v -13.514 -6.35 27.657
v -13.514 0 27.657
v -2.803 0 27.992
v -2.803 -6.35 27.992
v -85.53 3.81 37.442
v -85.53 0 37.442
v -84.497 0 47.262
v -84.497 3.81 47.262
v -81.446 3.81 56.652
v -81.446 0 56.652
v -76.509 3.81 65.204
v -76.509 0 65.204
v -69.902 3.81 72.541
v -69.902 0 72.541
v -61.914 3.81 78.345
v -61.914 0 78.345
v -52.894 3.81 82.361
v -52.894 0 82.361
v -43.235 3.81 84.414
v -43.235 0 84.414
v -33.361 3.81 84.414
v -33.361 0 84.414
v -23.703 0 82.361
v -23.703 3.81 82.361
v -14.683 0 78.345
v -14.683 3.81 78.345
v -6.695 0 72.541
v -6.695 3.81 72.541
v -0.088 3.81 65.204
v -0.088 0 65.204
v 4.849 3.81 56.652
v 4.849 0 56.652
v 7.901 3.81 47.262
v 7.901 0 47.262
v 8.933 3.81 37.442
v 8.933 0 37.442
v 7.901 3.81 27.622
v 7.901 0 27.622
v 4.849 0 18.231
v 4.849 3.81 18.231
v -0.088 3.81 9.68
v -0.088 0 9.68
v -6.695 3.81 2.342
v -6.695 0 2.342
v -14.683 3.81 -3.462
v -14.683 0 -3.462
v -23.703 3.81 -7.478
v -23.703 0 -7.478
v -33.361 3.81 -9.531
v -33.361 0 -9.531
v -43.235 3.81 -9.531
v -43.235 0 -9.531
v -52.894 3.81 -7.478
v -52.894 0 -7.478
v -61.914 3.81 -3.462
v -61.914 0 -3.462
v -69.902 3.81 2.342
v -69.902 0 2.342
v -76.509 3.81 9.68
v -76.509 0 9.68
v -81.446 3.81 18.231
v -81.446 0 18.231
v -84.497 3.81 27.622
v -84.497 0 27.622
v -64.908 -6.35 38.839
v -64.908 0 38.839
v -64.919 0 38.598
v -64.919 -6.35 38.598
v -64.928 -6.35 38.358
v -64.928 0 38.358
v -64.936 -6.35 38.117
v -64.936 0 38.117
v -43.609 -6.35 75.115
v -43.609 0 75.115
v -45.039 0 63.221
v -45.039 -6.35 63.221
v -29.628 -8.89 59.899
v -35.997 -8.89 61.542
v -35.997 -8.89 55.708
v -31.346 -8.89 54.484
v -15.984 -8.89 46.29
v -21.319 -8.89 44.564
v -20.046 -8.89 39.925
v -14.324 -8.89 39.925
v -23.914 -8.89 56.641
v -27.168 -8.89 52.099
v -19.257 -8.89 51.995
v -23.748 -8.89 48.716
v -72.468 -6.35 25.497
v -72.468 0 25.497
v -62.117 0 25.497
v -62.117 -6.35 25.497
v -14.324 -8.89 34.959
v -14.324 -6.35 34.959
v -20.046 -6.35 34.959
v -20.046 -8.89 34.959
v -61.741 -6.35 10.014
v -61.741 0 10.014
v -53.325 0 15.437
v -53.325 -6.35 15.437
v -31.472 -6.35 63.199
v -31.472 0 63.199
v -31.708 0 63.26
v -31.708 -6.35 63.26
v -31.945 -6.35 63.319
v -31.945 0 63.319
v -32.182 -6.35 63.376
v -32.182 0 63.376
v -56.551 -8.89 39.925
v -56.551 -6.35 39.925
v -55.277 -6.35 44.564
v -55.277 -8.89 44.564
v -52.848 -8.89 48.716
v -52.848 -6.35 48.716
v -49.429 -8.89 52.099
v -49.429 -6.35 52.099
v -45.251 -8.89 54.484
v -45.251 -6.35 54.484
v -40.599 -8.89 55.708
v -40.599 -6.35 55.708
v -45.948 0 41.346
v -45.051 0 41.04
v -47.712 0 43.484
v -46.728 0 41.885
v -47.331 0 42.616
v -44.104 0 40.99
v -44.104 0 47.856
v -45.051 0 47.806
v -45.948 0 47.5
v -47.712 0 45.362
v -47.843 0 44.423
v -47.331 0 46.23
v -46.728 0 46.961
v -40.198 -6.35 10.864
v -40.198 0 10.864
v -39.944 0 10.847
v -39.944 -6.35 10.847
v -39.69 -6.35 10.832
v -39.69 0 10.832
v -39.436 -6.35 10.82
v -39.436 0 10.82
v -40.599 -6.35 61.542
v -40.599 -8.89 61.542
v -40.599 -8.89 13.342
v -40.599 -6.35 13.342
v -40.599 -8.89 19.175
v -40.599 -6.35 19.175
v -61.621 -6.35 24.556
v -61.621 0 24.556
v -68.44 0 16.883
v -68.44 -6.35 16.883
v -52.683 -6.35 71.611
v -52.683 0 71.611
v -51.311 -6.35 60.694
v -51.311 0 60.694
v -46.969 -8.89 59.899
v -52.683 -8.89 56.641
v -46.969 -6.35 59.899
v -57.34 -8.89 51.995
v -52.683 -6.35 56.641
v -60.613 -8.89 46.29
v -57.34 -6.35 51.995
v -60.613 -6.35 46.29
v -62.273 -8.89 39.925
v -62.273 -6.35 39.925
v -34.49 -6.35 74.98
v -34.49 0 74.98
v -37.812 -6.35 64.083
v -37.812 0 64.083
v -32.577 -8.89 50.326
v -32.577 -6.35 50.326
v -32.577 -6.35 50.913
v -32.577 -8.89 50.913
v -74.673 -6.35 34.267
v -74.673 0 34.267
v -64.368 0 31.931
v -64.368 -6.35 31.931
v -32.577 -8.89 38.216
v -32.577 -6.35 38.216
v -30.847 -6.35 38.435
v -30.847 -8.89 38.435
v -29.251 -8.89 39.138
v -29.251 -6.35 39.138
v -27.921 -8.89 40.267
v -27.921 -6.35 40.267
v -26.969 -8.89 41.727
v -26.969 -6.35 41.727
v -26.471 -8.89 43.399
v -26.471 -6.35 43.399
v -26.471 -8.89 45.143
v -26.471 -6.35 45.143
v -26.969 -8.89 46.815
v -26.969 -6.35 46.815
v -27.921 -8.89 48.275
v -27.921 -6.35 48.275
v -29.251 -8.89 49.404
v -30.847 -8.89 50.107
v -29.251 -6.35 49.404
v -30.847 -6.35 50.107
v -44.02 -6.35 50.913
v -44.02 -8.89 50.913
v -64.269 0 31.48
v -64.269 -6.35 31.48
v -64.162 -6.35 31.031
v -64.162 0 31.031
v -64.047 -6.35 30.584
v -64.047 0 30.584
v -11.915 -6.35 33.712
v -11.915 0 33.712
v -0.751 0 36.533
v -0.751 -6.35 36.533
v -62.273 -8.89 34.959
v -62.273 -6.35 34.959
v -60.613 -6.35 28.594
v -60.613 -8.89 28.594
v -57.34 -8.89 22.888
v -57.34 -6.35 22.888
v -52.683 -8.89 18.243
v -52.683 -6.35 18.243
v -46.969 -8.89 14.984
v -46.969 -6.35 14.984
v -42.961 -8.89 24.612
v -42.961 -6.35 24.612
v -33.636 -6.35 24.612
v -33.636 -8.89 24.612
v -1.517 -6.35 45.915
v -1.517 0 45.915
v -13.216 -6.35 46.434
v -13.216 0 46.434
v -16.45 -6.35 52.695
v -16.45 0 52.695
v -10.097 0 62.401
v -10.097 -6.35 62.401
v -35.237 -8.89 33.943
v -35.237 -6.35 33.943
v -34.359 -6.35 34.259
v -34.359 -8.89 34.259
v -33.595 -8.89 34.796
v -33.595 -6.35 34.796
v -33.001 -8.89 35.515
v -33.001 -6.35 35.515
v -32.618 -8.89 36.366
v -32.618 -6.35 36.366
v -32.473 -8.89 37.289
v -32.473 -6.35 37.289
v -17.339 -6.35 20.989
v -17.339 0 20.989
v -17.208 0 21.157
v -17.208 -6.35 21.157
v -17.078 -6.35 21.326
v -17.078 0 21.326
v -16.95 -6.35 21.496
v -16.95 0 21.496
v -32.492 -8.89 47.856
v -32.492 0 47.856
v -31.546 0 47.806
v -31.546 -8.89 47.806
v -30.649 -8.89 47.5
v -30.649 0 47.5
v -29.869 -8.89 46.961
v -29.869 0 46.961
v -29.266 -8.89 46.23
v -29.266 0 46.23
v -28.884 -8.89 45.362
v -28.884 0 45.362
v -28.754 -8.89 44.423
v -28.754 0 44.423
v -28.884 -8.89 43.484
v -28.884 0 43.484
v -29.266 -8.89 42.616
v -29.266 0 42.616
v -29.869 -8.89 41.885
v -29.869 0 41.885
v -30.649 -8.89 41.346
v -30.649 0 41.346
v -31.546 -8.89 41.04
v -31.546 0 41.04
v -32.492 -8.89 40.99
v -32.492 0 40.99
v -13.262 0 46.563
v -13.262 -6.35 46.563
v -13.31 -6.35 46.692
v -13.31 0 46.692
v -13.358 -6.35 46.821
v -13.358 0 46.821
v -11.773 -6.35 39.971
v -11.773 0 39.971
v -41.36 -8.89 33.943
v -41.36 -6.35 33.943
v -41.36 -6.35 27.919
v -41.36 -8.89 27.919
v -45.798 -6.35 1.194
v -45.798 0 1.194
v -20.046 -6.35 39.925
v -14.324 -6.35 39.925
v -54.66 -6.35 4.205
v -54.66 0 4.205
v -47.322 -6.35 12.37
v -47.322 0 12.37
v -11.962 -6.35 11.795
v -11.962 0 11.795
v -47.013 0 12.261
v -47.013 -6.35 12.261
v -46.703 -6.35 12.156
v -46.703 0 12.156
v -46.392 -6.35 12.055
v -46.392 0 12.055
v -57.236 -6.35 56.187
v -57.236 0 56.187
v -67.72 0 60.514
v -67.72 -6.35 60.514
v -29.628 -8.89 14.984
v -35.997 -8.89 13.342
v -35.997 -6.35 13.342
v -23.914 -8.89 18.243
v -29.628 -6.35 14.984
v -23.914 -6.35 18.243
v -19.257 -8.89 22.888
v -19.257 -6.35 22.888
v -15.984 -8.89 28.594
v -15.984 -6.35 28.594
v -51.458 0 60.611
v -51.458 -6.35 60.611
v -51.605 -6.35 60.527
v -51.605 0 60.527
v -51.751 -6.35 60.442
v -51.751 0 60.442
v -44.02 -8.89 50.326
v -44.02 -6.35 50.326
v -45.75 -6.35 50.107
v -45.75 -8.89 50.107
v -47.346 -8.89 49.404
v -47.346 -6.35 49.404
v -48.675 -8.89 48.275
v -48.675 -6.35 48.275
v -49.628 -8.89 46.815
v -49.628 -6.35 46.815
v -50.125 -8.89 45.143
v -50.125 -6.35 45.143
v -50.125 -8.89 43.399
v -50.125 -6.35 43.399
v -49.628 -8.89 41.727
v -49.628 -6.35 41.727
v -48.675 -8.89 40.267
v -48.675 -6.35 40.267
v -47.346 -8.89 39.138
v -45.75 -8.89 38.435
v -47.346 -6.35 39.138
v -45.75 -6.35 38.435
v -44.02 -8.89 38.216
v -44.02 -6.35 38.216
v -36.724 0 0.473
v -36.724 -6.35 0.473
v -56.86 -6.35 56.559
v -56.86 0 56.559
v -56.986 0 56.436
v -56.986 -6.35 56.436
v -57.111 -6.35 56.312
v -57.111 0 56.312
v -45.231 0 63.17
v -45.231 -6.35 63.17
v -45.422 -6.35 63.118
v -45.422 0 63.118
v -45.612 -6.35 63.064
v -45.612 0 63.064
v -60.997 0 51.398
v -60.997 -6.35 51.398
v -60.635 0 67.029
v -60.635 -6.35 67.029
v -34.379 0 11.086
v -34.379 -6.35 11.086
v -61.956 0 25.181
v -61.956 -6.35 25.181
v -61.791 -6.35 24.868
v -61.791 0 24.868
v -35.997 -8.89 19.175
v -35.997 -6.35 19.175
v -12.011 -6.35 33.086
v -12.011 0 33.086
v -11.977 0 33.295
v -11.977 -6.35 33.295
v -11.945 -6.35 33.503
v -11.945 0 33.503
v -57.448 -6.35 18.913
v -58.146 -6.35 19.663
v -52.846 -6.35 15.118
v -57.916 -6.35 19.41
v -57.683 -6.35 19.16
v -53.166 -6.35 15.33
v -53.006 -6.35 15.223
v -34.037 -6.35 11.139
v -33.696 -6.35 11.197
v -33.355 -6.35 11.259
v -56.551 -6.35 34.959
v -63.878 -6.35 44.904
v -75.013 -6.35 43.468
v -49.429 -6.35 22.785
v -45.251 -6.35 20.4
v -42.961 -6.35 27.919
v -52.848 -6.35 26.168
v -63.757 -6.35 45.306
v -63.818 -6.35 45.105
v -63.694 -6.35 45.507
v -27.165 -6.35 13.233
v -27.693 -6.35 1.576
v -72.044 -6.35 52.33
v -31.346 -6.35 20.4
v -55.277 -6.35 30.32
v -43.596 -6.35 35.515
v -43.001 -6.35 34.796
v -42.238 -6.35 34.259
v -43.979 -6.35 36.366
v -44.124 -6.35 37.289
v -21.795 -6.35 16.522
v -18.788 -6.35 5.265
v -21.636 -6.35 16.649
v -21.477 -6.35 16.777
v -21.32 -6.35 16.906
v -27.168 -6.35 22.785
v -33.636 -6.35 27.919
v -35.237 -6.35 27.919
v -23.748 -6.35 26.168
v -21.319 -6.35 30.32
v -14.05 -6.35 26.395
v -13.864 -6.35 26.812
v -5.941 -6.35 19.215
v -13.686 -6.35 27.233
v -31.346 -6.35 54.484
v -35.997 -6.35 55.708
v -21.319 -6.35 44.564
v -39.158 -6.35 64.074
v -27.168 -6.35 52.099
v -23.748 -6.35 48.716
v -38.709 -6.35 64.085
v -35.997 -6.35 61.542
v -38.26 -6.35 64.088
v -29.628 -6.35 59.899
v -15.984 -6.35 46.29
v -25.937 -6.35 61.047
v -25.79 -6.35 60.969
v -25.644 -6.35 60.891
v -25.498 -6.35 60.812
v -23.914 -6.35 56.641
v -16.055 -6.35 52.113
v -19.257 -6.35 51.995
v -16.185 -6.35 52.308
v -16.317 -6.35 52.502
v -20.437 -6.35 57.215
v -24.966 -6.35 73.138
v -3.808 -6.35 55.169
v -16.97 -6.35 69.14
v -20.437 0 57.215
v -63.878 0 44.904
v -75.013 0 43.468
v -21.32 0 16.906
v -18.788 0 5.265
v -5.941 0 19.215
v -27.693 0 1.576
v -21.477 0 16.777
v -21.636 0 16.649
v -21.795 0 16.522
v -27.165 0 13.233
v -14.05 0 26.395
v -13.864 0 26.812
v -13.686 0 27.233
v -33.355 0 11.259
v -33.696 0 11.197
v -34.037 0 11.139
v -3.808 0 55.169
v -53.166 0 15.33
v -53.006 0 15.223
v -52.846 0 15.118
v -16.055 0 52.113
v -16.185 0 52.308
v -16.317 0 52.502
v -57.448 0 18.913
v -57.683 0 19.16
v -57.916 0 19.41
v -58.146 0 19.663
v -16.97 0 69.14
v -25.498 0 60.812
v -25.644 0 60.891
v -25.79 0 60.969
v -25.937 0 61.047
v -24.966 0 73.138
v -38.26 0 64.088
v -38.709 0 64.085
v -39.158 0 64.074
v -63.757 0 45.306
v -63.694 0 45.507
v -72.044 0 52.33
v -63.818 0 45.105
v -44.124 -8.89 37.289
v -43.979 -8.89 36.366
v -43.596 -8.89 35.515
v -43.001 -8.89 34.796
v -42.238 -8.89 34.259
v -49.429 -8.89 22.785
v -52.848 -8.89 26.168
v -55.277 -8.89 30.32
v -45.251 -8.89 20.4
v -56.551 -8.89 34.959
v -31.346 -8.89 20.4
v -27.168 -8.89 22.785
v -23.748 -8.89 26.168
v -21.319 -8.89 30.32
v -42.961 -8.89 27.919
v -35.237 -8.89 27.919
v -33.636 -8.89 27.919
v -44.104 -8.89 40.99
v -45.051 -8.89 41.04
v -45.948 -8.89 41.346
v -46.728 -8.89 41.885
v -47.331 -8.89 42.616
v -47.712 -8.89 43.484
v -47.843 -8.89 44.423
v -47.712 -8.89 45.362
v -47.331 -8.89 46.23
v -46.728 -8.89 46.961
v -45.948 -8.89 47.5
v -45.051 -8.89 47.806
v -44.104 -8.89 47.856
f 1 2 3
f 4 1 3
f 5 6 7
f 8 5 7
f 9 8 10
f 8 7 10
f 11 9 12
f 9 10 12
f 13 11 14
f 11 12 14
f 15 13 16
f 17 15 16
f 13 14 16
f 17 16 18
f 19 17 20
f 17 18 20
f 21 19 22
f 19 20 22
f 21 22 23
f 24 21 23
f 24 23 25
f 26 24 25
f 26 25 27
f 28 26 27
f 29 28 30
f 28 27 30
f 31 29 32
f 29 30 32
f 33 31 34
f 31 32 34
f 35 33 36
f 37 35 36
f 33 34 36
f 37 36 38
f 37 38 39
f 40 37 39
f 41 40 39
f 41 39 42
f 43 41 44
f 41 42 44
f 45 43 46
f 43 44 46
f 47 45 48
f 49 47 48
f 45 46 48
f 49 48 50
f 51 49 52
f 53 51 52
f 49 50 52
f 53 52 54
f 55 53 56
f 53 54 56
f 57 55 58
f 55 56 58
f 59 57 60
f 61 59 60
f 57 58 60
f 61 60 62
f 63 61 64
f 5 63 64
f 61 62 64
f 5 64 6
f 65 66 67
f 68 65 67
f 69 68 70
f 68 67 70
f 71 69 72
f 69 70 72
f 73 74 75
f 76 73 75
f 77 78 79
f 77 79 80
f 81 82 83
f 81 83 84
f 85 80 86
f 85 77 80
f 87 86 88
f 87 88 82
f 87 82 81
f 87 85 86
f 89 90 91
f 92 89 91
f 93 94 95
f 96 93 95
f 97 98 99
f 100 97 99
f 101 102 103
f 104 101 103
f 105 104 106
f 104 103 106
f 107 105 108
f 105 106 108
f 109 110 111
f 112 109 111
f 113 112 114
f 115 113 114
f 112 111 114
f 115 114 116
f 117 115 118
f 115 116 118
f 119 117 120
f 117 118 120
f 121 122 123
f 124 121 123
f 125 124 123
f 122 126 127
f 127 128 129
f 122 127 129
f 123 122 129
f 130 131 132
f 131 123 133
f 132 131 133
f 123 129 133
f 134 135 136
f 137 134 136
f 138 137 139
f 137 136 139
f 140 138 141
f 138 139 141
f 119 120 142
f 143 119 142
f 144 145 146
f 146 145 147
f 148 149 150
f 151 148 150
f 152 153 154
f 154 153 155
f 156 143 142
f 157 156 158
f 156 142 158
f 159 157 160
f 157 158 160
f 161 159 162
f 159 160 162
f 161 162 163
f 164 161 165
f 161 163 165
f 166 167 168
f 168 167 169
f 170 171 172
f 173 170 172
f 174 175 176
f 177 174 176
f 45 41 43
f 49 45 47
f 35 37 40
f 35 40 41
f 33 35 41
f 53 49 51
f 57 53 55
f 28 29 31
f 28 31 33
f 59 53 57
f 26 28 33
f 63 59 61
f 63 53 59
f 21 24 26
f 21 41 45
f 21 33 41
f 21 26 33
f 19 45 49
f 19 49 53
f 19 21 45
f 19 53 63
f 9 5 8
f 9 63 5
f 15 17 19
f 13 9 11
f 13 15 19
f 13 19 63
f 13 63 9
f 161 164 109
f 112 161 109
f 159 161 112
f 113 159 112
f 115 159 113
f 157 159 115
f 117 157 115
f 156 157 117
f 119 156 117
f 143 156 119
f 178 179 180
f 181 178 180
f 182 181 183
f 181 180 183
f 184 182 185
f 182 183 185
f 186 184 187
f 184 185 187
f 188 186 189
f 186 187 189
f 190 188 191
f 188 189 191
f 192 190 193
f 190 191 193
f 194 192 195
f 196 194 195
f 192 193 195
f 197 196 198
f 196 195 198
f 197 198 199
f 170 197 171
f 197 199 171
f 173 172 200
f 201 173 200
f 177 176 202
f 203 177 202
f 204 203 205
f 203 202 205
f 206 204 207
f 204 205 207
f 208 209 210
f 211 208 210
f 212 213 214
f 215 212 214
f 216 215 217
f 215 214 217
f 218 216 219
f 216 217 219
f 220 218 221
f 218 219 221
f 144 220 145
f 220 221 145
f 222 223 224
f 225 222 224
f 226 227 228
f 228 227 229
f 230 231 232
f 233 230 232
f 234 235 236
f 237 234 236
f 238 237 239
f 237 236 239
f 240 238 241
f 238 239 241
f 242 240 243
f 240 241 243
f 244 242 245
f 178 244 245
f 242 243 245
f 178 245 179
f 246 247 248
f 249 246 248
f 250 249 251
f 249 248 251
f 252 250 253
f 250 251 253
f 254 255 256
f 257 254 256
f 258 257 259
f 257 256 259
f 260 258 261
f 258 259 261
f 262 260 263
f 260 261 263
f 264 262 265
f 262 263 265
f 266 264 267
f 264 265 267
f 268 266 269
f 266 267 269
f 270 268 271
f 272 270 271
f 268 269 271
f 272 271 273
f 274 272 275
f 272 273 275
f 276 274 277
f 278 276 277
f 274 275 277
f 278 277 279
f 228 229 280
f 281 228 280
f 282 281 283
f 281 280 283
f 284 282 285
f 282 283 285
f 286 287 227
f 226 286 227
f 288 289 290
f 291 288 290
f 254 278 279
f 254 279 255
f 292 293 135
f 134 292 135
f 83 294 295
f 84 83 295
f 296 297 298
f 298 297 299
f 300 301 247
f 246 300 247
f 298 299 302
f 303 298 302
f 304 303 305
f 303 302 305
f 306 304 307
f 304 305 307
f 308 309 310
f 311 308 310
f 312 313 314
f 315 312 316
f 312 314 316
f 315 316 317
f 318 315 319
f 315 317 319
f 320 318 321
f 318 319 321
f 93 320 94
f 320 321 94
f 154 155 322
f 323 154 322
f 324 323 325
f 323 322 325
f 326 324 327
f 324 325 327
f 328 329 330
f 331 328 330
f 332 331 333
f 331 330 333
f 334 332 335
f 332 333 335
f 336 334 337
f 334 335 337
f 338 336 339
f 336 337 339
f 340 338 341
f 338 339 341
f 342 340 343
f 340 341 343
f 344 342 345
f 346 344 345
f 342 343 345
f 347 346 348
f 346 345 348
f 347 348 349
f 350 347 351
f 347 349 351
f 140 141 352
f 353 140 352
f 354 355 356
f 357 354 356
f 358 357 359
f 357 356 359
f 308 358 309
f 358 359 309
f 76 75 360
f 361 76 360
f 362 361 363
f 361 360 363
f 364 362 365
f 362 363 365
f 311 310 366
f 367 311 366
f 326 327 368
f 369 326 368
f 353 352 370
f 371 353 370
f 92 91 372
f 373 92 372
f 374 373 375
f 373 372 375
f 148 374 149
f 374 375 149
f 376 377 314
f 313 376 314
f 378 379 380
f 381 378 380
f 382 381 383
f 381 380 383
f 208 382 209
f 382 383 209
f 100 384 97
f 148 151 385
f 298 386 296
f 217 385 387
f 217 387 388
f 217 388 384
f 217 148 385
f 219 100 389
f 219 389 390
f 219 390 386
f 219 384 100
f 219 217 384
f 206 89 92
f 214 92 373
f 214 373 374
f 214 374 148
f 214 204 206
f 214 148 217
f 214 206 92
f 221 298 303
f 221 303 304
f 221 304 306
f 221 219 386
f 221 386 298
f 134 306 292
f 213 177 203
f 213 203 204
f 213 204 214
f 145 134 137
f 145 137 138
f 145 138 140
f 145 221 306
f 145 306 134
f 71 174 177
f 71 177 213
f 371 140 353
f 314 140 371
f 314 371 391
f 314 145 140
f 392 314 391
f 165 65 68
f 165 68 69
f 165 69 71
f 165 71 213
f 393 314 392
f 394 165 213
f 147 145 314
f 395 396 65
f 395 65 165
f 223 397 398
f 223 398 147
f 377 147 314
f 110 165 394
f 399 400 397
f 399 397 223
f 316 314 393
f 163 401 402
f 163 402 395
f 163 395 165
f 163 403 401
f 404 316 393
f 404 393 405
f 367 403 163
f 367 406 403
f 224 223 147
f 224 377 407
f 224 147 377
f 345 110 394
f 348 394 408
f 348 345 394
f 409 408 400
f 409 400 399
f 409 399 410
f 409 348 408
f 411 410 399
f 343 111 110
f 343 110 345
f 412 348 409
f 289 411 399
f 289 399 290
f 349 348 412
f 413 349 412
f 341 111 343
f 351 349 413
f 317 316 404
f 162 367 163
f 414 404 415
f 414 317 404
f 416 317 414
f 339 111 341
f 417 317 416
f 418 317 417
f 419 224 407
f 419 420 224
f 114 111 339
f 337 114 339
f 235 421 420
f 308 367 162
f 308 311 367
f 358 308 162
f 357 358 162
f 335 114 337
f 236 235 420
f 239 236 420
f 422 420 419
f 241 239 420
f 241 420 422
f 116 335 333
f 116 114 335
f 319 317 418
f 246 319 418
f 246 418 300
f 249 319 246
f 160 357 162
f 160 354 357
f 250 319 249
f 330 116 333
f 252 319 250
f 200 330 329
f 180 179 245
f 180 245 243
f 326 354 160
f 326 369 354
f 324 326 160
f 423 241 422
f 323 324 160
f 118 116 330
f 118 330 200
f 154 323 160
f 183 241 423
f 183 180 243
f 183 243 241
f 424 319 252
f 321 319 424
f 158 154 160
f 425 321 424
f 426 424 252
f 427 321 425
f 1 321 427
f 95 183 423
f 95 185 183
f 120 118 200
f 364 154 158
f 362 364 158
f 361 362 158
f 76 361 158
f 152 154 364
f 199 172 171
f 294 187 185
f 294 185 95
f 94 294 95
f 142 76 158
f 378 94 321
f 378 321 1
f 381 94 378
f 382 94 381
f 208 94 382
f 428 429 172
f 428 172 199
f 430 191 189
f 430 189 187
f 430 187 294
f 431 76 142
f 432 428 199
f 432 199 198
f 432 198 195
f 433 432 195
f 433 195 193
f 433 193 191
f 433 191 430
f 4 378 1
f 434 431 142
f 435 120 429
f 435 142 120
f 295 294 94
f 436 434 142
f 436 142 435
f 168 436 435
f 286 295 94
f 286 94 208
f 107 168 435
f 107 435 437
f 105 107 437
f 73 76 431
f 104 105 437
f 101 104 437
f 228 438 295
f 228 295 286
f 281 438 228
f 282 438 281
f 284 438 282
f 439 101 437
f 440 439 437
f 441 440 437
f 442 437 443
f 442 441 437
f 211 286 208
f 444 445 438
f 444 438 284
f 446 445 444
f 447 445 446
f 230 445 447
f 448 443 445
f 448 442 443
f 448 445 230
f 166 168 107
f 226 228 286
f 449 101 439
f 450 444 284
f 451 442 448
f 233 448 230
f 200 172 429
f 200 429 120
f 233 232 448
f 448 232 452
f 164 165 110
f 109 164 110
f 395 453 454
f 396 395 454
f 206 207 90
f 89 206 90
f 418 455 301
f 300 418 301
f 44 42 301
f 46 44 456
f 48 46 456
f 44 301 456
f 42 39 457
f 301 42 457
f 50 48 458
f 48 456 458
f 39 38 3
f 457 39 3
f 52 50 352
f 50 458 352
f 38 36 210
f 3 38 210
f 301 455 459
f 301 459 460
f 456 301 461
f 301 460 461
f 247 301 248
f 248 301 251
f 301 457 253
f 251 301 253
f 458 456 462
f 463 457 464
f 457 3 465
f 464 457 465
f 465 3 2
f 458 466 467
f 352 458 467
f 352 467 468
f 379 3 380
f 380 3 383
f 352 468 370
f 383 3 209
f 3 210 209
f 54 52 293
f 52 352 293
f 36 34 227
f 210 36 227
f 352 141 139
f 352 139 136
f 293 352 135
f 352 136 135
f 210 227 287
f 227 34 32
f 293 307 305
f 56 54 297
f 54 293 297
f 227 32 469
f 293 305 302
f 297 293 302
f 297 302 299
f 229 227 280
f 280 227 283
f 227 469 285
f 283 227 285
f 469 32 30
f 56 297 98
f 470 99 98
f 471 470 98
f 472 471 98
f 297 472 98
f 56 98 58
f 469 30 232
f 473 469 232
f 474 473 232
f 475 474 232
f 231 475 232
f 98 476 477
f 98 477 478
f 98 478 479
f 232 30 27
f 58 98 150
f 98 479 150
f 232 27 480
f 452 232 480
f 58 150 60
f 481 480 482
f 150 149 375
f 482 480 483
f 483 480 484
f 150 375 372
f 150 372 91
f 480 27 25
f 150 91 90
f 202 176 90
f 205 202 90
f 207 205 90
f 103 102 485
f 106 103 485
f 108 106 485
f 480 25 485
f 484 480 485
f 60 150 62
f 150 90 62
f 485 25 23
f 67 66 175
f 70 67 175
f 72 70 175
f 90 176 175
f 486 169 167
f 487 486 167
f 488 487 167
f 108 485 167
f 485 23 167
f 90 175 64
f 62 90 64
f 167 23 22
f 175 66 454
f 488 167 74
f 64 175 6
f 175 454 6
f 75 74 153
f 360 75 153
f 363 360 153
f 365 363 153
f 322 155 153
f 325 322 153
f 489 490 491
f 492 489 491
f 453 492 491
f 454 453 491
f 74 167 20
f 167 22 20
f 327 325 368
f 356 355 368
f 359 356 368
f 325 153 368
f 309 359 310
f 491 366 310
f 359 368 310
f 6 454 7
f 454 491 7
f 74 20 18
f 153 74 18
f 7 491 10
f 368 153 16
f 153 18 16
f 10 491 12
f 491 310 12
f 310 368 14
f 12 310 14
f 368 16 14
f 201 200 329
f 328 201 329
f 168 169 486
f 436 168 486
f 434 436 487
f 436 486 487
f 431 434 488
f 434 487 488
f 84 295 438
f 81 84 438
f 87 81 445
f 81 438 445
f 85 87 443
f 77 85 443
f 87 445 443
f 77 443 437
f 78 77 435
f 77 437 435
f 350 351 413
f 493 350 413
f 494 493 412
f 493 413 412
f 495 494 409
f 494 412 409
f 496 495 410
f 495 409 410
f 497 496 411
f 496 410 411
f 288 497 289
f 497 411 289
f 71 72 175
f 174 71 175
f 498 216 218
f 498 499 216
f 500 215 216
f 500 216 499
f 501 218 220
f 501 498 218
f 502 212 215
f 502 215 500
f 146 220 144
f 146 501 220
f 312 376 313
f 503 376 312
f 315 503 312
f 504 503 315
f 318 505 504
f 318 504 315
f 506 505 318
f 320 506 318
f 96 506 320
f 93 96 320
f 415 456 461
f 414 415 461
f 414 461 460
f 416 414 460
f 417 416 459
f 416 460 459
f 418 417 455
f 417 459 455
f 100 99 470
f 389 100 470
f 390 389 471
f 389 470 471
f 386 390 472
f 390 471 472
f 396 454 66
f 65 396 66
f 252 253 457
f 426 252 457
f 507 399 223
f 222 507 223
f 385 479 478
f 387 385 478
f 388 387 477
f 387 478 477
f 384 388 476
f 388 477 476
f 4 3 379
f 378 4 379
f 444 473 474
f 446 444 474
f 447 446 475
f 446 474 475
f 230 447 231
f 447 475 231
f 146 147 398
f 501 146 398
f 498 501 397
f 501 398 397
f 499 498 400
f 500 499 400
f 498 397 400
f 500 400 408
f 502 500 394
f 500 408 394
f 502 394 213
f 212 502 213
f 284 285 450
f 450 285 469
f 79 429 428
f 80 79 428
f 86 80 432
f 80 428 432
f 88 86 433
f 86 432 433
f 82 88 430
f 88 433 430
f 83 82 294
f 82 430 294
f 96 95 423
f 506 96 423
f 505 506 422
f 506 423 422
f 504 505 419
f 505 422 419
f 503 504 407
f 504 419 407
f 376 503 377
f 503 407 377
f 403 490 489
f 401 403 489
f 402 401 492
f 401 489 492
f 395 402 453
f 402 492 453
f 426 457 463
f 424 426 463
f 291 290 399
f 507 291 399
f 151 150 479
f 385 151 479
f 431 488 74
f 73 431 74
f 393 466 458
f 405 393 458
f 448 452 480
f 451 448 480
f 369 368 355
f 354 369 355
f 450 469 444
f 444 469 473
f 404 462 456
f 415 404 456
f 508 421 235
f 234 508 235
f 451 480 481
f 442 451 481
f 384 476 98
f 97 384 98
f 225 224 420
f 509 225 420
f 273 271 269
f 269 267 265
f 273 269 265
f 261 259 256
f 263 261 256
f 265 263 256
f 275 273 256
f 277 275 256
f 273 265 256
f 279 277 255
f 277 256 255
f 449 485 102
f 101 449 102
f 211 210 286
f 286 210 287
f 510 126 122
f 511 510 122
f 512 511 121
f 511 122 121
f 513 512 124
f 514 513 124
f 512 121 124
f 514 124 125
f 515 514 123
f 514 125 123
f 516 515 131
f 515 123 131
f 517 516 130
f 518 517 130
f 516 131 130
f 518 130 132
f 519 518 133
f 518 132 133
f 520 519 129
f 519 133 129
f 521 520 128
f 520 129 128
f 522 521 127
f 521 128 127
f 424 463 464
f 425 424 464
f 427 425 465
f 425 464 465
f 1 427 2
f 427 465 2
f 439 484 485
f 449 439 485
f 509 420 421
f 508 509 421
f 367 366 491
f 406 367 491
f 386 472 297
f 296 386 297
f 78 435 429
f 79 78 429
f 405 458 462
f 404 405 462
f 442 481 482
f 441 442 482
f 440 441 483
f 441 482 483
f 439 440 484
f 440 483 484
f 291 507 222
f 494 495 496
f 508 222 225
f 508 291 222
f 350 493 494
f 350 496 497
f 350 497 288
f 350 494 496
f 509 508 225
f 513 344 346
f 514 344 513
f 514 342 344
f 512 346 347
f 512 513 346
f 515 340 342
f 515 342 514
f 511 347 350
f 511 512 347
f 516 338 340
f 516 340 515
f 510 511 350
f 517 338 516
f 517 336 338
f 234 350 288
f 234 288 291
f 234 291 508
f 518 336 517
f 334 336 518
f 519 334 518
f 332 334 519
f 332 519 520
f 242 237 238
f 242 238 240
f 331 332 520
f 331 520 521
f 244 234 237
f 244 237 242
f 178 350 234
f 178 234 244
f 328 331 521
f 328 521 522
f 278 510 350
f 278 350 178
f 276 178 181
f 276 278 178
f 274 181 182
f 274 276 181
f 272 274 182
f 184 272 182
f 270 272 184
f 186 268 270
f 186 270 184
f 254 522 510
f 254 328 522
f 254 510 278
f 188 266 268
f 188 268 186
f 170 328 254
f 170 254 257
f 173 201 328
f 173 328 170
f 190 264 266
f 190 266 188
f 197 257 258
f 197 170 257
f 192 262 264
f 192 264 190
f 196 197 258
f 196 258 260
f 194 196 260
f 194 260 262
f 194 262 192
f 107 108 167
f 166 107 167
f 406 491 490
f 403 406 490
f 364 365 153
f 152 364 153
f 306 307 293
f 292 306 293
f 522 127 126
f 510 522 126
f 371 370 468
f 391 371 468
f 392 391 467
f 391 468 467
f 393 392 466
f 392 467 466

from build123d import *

# Parameters (mm, degrees)
F1_DEPTH = 6.35
F2_DEPTH = 8.89
F3_R     = 47.231154
F4_DEPTH = 3.81


with BuildPart() as f1:
    # F0 (on Front) → F1 (new body)
    with BuildSketch(Plane.XZ):
        with BuildLine():
            Line((-72.468472, 25.497057), (-62.116886, 25.497057))
            ThreePointArc((-62.116886, 25.497057), (-63.211959, 27.991302), (-64.046652, 30.584319))
            Line((-64.046652, 30.584319), (-72.468472, 25.497057))
        make_face()
        with BuildLine():
            Line((-68.440348, 16.882773), (-58.145573, 19.662977))
            ThreePointArc((-58.145573, 19.662977), (-60.02173, 22.01151), (-61.621433, 24.556412))
            Line((-61.621433, 24.556412), (-68.440348, 16.882773))
        make_face()
        with BuildLine():
            Line((-61.740946, 10.013767), (-53.325096, 15.437365))
            ThreePointArc((-53.325096, 15.437365), (-55.474469, 17.070756), (-57.447538, 18.913246))
            Line((-57.447538, 18.913246), (-61.740946, 10.013767))
        make_face()
        with BuildLine():
            Line((-54.659933, 4.204792), (-47.321835, 12.370412))
            ThreePointArc((-47.321835, 12.370412), (-50.163723, 13.583659), (-52.846042, 15.117758))
            Line((-52.846042, 15.117758), (-54.659933, 4.204792))
        make_face()
        with BuildLine():
            Line((-45.798071, 1.194302), (-40.197733, 10.863806))
            ThreePointArc((-40.197733, 10.863806), (-43.33033, 11.275472), (-46.392177, 12.055038))
            Line((-46.392177, 12.055038), (-45.798071, 1.194302))
        make_face()
        with BuildLine():
            Line((-27.692726, 1.575914), (-27.164938, 13.233446))
            ThreePointArc((-27.164938, 13.233446), (-30.199563, 12.056629), (-33.355031, 11.258583))
            Line((-33.355031, 11.258583), (-27.692726, 1.575914))
        make_face()
        with BuildLine():
            Line((-36.724199, 0.473481), (-34.378867, 11.085872))
            ThreePointArc((-34.378867, 11.085872), (-36.901094, 10.832685), (-39.435966, 10.82032))
            Line((-39.435966, 10.82032), (-36.724199, 0.473481))
        make_face()
        with BuildLine():
            Line((-18.788459, 5.264825), (-21.794904, 16.522102))
            ThreePointArc((-21.794904, 16.522102), (-24.382431, 14.718584), (-27.164938, 13.233446))
            Line((-27.164938, 13.233446), (-18.788459, 5.264825))
        make_face()
        with BuildLine():
            Line((-11.961851, 11.79462), (-17.338687, 20.989131))
            ThreePointArc((-17.338687, 20.989131), (-19.219819, 18.840528), (-21.32009, 16.905583))
            Line((-21.32009, 16.905583), (-11.961851, 11.79462))
        make_face()
        with BuildLine():
            Line((-5.94087, 19.214842), (-14.050301, 26.395063))
            ThreePointArc((-14.050301, 26.395063), (-15.369085, 23.868043), (-16.950265, 21.496357))
            Line((-16.950265, 21.496357), (-5.94087, 19.214842))
        make_face()
        with BuildLine():
            Line((-2.803177, 27.991908), (-12.01095, 33.086167))
            ThreePointArc((-12.01095, 33.086167), (-12.618733, 30.331533), (-13.514323, 27.656588))
            Line((-13.514323, 27.656588), (-2.803177, 27.991908))
        make_face()
        with BuildLine():
            ThreePointArc((-11.772855, 39.971174), (-11.682633, 38.707943), (-11.652537, 37.441852))
            ThreePointArc((-11.652537, 37.441852), (-11.718199, 35.572378), (-11.914862, 33.712118))
            Line((-11.914862, 33.712118), (-0.750545, 36.533233))
            Line((-0.750545, 36.533233), (-11.772855, 39.971174))
        make_face()
        with BuildLine():
            ThreePointArc((-13.215669, 46.433987), (-12.292717, 43.247575), (-11.772855, 39.971174))
            Line((-11.772855, 39.971174), (-1.516628, 45.914907))
            Line((-1.516628, 45.914907), (-13.215669, 46.433987))
        make_face()
        with BuildLine():
            ThreePointArc((-16.055091, 52.112807), (-14.558451, 49.542126), (-13.357668, 46.820646))
            Line((-13.357668, 46.820646), (-3.80768, 55.16896))
            Line((-3.80768, 55.16896), (-16.055091, 52.112807))
        make_face()
        with BuildLine():
            ThreePointArc((-20.436903, 57.21477), (-18.31548, 55.068095), (-16.450419, 52.69529))
            Line((-16.450419, 52.69529), (-10.096844, 62.401496))
            Line((-10.096844, 62.401496), (-20.436903, 57.21477))
        make_face()
        with BuildLine():
            ThreePointArc((-25.497871, 60.81165), (-22.862262, 59.161126), (-20.436903, 57.21477))
            Line((-20.436903, 57.21477), (-16.969999, 69.139883))
            Line((-16.969999, 69.139883), (-25.497871, 60.81165))
        make_face()
        with BuildLine():
            ThreePointArc((-31.47247, 63.198546), (-28.644405, 62.277334), (-25.936627, 61.046672))
            Line((-25.936627, 61.046672), (-24.966219, 73.137991))
            Line((-24.966219, 73.137991), (-31.47247, 63.198546))
        make_face()
        with BuildLine():
            ThreePointArc((-37.811687, 64.083234), (-34.977744, 63.87996), (-32.181556, 63.376091))
            Line((-32.181556, 63.376091), (-34.489807, 74.979819))
            Line((-34.489807, 74.979819), (-37.811687, 64.083234))
        make_face()
        with BuildLine():
            ThreePointArc((-45.039301, 63.220911), (-42.122507, 63.811835), (-39.158008, 64.073808))
            Line((-39.158008, 64.073808), (-43.60909, 75.114585))
            Line((-43.60909, 75.114585), (-45.039301, 63.220911))
        make_face()
        with BuildLine():
            ThreePointArc((-51.31089, 60.694255), (-48.530531, 62.044756), (-45.61248, 63.064182))
            Line((-45.61248, 63.064182), (-52.68345, 71.61063))
            Line((-52.68345, 71.61063), (-51.31089, 60.694255))
        make_face()
        with BuildLine():
            ThreePointArc((-56.859722, 56.559281), (-54.422673, 58.655215), (-51.750978, 60.442445))
            Line((-51.750978, 60.442445), (-60.634747, 67.028522))
            Line((-60.634747, 67.028522), (-56.859722, 56.559281))
        make_face()
        with BuildLine():
            ThreePointArc((-60.99712, 51.397732), (-59.253808, 53.899964), (-57.236001, 56.186611))
            Line((-57.236001, 56.186611), (-67.719519, 60.513683))
            Line((-67.719519, 60.513683), (-60.99712, 51.397732))
        make_face()
        with BuildLine():
            ThreePointArc((-63.694328, 45.506906), (-62.525435, 48.534603), (-60.99712, 51.397732))
            Line((-60.99712, 51.397732), (-72.044447, 52.330237))
            Line((-72.044447, 52.330237), (-63.694328, 45.506906))
        make_face()
        with BuildLine():
            ThreePointArc((-64.907544, 38.838859), (-64.568395, 41.901175), (-63.878012, 44.90387))
            Line((-63.878012, 44.90387), (-75.012535, 43.468371))
            Line((-75.012535, 43.468371), (-64.907544, 38.838859))
        make_face()
        with BuildLine():
            ThreePointArc((-64.368101, 31.931053), (-64.832743, 35.007338), (-64.935641, 38.116812))
            Line((-64.935641, 38.116812), (-74.673332, 34.267295))
            Line((-74.673332, 34.267295), (-64.368101, 31.931053))
        make_face()
        with BuildLine():
            ThreePointArc((-11.914862, 33.712118), (-11.718199, 35.572378), (-11.652537, 37.441852))
            ThreePointArc((-11.652537, 37.441852), (-11.682633, 38.707943), (-11.772855, 39.971174))
            ThreePointArc((-11.772855, 39.971174), (-12.292717, 43.247575), (-13.215669, 46.433987))
            ThreePointArc((-13.215669, 46.433987), (-13.285921, 46.627591), (-13.357668, 46.820646))
            ThreePointArc((-13.357668, 46.820646), (-14.558451, 49.542126), (-16.055091, 52.112807))
            ThreePointArc((-16.055091, 52.112807), (-16.250831, 52.405354), (-16.450419, 52.69529))
            ThreePointArc((-16.450419, 52.69529), (-18.31548, 55.068095), (-20.436903, 57.21477))
            ThreePointArc((-20.436903, 57.21477), (-22.862262, 59.161126), (-25.497871, 60.81165))
            ThreePointArc((-25.497871, 60.81165), (-25.7167, 60.930186), (-25.936627, 61.046672))
            ThreePointArc((-25.936627, 61.046672), (-28.644405, 62.277334), (-31.47247, 63.198546))
            ThreePointArc((-31.47247, 63.198546), (-31.826404, 63.28975), (-32.181556, 63.376091))
            ThreePointArc((-32.181556, 63.376091), (-34.977744, 63.87996), (-37.811687, 64.083234))
            ThreePointArc((-37.811687, 64.083234), (-38.484907, 64.087026), (-39.158008, 64.073808))
            ThreePointArc((-39.158008, 64.073808), (-42.122507, 63.811835), (-45.039301, 63.220911))
            ThreePointArc((-45.039301, 63.220911), (-45.326327, 63.144144), (-45.61248, 63.064182))
            ThreePointArc((-45.61248, 63.064182), (-48.530531, 62.044756), (-51.31089, 60.694255))
            ThreePointArc((-51.31089, 60.694255), (-51.531533, 60.569397), (-51.750978, 60.442445))
            ThreePointArc((-51.750978, 60.442445), (-54.422673, 58.655215), (-56.859722, 56.559281))
            ThreePointArc((-56.859722, 56.559281), (-57.048788, 56.373881), (-57.236001, 56.186611))
            ThreePointArc((-57.236001, 56.186611), (-59.253808, 53.899964), (-60.99712, 51.397732))
            ThreePointArc((-60.99712, 51.397732), (-62.525435, 48.534603), (-63.694328, 45.506906))
            ThreePointArc((-63.694328, 45.506906), (-63.787954, 45.205932), (-63.878012, 44.90387))
            ThreePointArc((-63.878012, 44.90387), (-64.568395, 41.901175), (-64.907544, 38.838859))
            ThreePointArc((-64.907544, 38.838859), (-64.924041, 38.47793), (-64.935641, 38.116812))
            ThreePointArc((-64.935641, 38.116812), (-64.832743, 35.007338), (-64.368101, 31.931053))
            ThreePointArc((-64.368101, 31.931053), (-64.216126, 31.255598), (-64.046652, 30.584319))
            ThreePointArc((-64.046652, 30.584319), (-63.211959, 27.991302), (-62.116886, 25.497057))
            ThreePointArc((-62.116886, 25.497057), (-61.873851, 25.024263), (-61.621433, 24.556412))
            ThreePointArc((-61.621433, 24.556412), (-60.02173, 22.01151), (-58.145573, 19.662977))
            ThreePointArc((-58.145573, 19.662977), (-57.800159, 19.284757), (-57.447538, 18.913246))
            ThreePointArc((-57.447538, 18.913246), (-55.474469, 17.070756), (-53.325096, 15.437365))
            ThreePointArc((-53.325096, 15.437365), (-53.086433, 15.276267), (-52.846042, 15.117758))
            ThreePointArc((-52.846042, 15.117758), (-50.163723, 13.583659), (-47.321835, 12.370412))
            ThreePointArc((-47.321835, 12.370412), (-46.858458, 12.208444), (-46.392177, 12.055038))
            ThreePointArc((-46.392177, 12.055038), (-43.33033, 11.275472), (-40.197733, 10.863806))
            ThreePointArc((-40.197733, 10.863806), (-39.817005, 10.839336), (-39.435966, 10.82032))
            ThreePointArc((-39.435966, 10.82032), (-36.901094, 10.832685), (-34.378867, 11.085872))
            ThreePointArc((-34.378867, 11.085872), (-33.866108, 11.16724), (-33.355031, 11.258583))
            ThreePointArc((-33.355031, 11.258583), (-30.199563, 12.056629), (-27.164938, 13.233446))
            ThreePointArc((-27.164938, 13.233446), (-24.382431, 14.718584), (-21.794904, 16.522102))
            ThreePointArc((-21.794904, 16.522102), (-21.556399, 16.712483), (-21.32009, 16.905583))
            ThreePointArc((-21.32009, 16.905583), (-19.219819, 18.840528), (-17.338687, 20.989131))
            ThreePointArc((-17.338687, 20.989131), (-17.142956, 21.24158), (-16.950265, 21.496357))
            ThreePointArc((-16.950265, 21.496357), (-15.369085, 23.868043), (-14.050301, 26.395063))
            ThreePointArc((-14.050301, 26.395063), (-13.774199, 27.022379), (-13.514323, 27.656588))
            ThreePointArc((-13.514323, 27.656588), (-12.618733, 30.331533), (-12.01095, 33.086167))
            ThreePointArc((-12.01095, 33.086167), (-11.961046, 33.398857), (-11.914862, 33.712118))
        make_face()
        with BuildLine():
            Line((-62.272575, 34.958918), (-56.551188, 34.958918))
            ThreePointArc((-56.551188, 34.958918), (-51.24926, 24.364516), (-40.599231, 19.175231))
            Line((-40.599231, 19.175231), (-40.599231, 13.341561))
            ThreePointArc((-40.599231, 13.341561), (-55.165827, 20.410655), (-62.272575, 34.958918))
        make_face(mode=Mode.SUBTRACT)
        with BuildLine():
            Line((-44.019647, 50.325666), (-44.019647, 50.912552))
            Line((-44.019647, 50.912552), (-38.298364, 50.912552))
            Line((-38.298364, 50.912552), (-32.577081, 50.912552))
            Line((-32.577081, 50.912552), (-32.577081, 50.325666))
            ThreePointArc((-32.577081, 50.325666), (-26.408391, 44.270882), (-32.577081, 38.216099))
            ThreePointArc((-32.577081, 38.216099), (-33.00076, 35.515299), (-35.236961, 33.942647))
            Line((-35.236961, 33.942647), (-35.236961, 27.918598))
            Line((-35.236961, 27.918598), (-33.635846, 27.918598))
            Line((-33.635846, 27.918598), (-33.635846, 24.611946))
            Line((-33.635846, 24.611946), (-38.298364, 24.611946))
            Line((-38.298364, 24.611946), (-42.960882, 24.611946))
            Line((-42.960882, 24.611946), (-42.960882, 27.918598))
            Line((-42.960882, 27.918598), (-41.359767, 27.918598))
            Line((-41.359767, 27.918598), (-41.359767, 33.942647))
            ThreePointArc((-41.359767, 33.942647), (-43.595968, 35.515299), (-44.019647, 38.216099))
            ThreePointArc((-44.019647, 38.216099), (-50.188337, 44.270882), (-44.019647, 50.325666))
        make_face(mode=Mode.SUBTRACT)
        with BuildLine():
            Line((-35.997497, 13.341561), (-35.997497, 19.175231))
            ThreePointArc((-35.997497, 19.175231), (-25.347468, 24.364516), (-20.04554, 34.958918))
            Line((-20.04554, 34.958918), (-14.324153, 34.958918))
            ThreePointArc((-14.324153, 34.958918), (-21.430901, 20.410655), (-35.997497, 13.341561))
        make_face(mode=Mode.SUBTRACT)
        with BuildLine():
            ThreePointArc((-40.599231, 55.708472), (-51.24926, 50.519188), (-56.551188, 39.924786))
            Line((-56.551188, 39.924786), (-62.272575, 39.924786))
            ThreePointArc((-62.272575, 39.924786), (-55.165827, 54.473048), (-40.599231, 61.542143))
            Line((-40.599231, 61.542143), (-40.599231, 55.708472))
        make_face(mode=Mode.SUBTRACT)
        with BuildLine():
            ThreePointArc((-20.04554, 39.924786), (-25.347468, 50.519188), (-35.997497, 55.708472))
            Line((-35.997497, 55.708472), (-35.997497, 61.542143))
            ThreePointArc((-35.997497, 61.542143), (-21.430901, 54.473048), (-14.324153, 39.924786))
            Line((-14.324153, 39.924786), (-20.04554, 39.924786))
        make_face(mode=Mode.SUBTRACT)
    extrude(amount=F1_DEPTH)

    # F0 (on Front) → F2 (join)
    with BuildSketch(Plane.XZ):
        with BuildLine():
            ThreePointArc((-40.599231, 19.175231), (-51.24926, 24.364516), (-56.551188, 34.958918))
            Line((-56.551188, 34.958918), (-62.272575, 34.958918))
            ThreePointArc((-62.272575, 34.958918), (-55.165827, 20.410655), (-40.599231, 13.341561))
            Line((-40.599231, 13.341561), (-40.599231, 19.175231))
        make_face()
        with BuildLine():
            ThreePointArc((-20.04554, 34.958918), (-25.347468, 24.364516), (-35.997497, 19.175231))
            Line((-35.997497, 19.175231), (-35.997497, 13.341561))
            ThreePointArc((-35.997497, 13.341561), (-21.430901, 20.410655), (-14.324153, 34.958918))
            Line((-14.324153, 34.958918), (-20.04554, 34.958918))
        make_face()
        with BuildLine():
            Line((-35.997497, 61.542143), (-35.997497, 55.708472))
            ThreePointArc((-35.997497, 55.708472), (-25.347468, 50.519188), (-20.04554, 39.924786))
            Line((-20.04554, 39.924786), (-14.324153, 39.924786))
            ThreePointArc((-14.324153, 39.924786), (-21.430901, 54.473048), (-35.997497, 61.542143))
        make_face()
        with BuildLine():
            Line((-62.272575, 39.924786), (-56.551188, 39.924786))
            ThreePointArc((-56.551188, 39.924786), (-51.24926, 50.519188), (-40.599231, 55.708472))
            Line((-40.599231, 55.708472), (-40.599231, 61.542143))
            ThreePointArc((-40.599231, 61.542143), (-55.165827, 54.473048), (-62.272575, 39.924786))
        make_face()
        with BuildLine():
            Line((-38.298364, 50.912552), (-44.019647, 50.912552))
            Line((-44.019647, 50.912552), (-44.019647, 50.325666))
            ThreePointArc((-44.019647, 50.325666), (-50.188337, 44.270882), (-44.019647, 38.216099))
            ThreePointArc((-44.019647, 38.216099), (-43.595968, 35.515299), (-41.359767, 33.942647))
            Line((-41.359767, 33.942647), (-41.359767, 27.918598))
            Line((-41.359767, 27.918598), (-42.960882, 27.918598))
            Line((-42.960882, 27.918598), (-42.960882, 24.611946))
            Line((-42.960882, 24.611946), (-38.298364, 24.611946))
            Line((-38.298364, 24.611946), (-33.635846, 24.611946))
            Line((-33.635846, 24.611946), (-33.635846, 27.918598))
            Line((-33.635846, 27.918598), (-35.236961, 27.918598))
            Line((-35.236961, 27.918598), (-35.236961, 33.942647))
            ThreePointArc((-35.236961, 33.942647), (-33.00076, 35.515299), (-32.577081, 38.216099))
            ThreePointArc((-32.577081, 38.216099), (-26.408391, 44.270882), (-32.577081, 50.325666))
            Line((-32.577081, 50.325666), (-32.577081, 50.912552))
            Line((-32.577081, 50.912552), (-38.298364, 50.912552))
        make_face()
        with BuildLine():
            Line((-44.104263, 47.856074), (-44.104263, 40.99014))
            ThreePointArc((-44.104263, 40.99014), (-47.84285, 44.423107), (-44.104263, 47.856074))
        make_face(mode=Mode.SUBTRACT)
        with BuildLine():
            Line((-32.492465, 40.99014), (-32.492465, 47.856074))
            ThreePointArc((-32.492465, 47.856074), (-28.753878, 44.423107), (-32.492465, 40.99014))
        make_face(mode=Mode.SUBTRACT)
    extrude(amount=F2_DEPTH)

    # F3 (on face) → F4 (join)
    with BuildSketch(Plane(origin=(0, 0, 0), x_dir=(-1, 0, 0), z_dir=(0, 1, 0))):
        with Locations((38.298364, 37.441852)):
            Circle(F3_R)
    extrude(amount=F4_DEPTH)


solid = f1.part
